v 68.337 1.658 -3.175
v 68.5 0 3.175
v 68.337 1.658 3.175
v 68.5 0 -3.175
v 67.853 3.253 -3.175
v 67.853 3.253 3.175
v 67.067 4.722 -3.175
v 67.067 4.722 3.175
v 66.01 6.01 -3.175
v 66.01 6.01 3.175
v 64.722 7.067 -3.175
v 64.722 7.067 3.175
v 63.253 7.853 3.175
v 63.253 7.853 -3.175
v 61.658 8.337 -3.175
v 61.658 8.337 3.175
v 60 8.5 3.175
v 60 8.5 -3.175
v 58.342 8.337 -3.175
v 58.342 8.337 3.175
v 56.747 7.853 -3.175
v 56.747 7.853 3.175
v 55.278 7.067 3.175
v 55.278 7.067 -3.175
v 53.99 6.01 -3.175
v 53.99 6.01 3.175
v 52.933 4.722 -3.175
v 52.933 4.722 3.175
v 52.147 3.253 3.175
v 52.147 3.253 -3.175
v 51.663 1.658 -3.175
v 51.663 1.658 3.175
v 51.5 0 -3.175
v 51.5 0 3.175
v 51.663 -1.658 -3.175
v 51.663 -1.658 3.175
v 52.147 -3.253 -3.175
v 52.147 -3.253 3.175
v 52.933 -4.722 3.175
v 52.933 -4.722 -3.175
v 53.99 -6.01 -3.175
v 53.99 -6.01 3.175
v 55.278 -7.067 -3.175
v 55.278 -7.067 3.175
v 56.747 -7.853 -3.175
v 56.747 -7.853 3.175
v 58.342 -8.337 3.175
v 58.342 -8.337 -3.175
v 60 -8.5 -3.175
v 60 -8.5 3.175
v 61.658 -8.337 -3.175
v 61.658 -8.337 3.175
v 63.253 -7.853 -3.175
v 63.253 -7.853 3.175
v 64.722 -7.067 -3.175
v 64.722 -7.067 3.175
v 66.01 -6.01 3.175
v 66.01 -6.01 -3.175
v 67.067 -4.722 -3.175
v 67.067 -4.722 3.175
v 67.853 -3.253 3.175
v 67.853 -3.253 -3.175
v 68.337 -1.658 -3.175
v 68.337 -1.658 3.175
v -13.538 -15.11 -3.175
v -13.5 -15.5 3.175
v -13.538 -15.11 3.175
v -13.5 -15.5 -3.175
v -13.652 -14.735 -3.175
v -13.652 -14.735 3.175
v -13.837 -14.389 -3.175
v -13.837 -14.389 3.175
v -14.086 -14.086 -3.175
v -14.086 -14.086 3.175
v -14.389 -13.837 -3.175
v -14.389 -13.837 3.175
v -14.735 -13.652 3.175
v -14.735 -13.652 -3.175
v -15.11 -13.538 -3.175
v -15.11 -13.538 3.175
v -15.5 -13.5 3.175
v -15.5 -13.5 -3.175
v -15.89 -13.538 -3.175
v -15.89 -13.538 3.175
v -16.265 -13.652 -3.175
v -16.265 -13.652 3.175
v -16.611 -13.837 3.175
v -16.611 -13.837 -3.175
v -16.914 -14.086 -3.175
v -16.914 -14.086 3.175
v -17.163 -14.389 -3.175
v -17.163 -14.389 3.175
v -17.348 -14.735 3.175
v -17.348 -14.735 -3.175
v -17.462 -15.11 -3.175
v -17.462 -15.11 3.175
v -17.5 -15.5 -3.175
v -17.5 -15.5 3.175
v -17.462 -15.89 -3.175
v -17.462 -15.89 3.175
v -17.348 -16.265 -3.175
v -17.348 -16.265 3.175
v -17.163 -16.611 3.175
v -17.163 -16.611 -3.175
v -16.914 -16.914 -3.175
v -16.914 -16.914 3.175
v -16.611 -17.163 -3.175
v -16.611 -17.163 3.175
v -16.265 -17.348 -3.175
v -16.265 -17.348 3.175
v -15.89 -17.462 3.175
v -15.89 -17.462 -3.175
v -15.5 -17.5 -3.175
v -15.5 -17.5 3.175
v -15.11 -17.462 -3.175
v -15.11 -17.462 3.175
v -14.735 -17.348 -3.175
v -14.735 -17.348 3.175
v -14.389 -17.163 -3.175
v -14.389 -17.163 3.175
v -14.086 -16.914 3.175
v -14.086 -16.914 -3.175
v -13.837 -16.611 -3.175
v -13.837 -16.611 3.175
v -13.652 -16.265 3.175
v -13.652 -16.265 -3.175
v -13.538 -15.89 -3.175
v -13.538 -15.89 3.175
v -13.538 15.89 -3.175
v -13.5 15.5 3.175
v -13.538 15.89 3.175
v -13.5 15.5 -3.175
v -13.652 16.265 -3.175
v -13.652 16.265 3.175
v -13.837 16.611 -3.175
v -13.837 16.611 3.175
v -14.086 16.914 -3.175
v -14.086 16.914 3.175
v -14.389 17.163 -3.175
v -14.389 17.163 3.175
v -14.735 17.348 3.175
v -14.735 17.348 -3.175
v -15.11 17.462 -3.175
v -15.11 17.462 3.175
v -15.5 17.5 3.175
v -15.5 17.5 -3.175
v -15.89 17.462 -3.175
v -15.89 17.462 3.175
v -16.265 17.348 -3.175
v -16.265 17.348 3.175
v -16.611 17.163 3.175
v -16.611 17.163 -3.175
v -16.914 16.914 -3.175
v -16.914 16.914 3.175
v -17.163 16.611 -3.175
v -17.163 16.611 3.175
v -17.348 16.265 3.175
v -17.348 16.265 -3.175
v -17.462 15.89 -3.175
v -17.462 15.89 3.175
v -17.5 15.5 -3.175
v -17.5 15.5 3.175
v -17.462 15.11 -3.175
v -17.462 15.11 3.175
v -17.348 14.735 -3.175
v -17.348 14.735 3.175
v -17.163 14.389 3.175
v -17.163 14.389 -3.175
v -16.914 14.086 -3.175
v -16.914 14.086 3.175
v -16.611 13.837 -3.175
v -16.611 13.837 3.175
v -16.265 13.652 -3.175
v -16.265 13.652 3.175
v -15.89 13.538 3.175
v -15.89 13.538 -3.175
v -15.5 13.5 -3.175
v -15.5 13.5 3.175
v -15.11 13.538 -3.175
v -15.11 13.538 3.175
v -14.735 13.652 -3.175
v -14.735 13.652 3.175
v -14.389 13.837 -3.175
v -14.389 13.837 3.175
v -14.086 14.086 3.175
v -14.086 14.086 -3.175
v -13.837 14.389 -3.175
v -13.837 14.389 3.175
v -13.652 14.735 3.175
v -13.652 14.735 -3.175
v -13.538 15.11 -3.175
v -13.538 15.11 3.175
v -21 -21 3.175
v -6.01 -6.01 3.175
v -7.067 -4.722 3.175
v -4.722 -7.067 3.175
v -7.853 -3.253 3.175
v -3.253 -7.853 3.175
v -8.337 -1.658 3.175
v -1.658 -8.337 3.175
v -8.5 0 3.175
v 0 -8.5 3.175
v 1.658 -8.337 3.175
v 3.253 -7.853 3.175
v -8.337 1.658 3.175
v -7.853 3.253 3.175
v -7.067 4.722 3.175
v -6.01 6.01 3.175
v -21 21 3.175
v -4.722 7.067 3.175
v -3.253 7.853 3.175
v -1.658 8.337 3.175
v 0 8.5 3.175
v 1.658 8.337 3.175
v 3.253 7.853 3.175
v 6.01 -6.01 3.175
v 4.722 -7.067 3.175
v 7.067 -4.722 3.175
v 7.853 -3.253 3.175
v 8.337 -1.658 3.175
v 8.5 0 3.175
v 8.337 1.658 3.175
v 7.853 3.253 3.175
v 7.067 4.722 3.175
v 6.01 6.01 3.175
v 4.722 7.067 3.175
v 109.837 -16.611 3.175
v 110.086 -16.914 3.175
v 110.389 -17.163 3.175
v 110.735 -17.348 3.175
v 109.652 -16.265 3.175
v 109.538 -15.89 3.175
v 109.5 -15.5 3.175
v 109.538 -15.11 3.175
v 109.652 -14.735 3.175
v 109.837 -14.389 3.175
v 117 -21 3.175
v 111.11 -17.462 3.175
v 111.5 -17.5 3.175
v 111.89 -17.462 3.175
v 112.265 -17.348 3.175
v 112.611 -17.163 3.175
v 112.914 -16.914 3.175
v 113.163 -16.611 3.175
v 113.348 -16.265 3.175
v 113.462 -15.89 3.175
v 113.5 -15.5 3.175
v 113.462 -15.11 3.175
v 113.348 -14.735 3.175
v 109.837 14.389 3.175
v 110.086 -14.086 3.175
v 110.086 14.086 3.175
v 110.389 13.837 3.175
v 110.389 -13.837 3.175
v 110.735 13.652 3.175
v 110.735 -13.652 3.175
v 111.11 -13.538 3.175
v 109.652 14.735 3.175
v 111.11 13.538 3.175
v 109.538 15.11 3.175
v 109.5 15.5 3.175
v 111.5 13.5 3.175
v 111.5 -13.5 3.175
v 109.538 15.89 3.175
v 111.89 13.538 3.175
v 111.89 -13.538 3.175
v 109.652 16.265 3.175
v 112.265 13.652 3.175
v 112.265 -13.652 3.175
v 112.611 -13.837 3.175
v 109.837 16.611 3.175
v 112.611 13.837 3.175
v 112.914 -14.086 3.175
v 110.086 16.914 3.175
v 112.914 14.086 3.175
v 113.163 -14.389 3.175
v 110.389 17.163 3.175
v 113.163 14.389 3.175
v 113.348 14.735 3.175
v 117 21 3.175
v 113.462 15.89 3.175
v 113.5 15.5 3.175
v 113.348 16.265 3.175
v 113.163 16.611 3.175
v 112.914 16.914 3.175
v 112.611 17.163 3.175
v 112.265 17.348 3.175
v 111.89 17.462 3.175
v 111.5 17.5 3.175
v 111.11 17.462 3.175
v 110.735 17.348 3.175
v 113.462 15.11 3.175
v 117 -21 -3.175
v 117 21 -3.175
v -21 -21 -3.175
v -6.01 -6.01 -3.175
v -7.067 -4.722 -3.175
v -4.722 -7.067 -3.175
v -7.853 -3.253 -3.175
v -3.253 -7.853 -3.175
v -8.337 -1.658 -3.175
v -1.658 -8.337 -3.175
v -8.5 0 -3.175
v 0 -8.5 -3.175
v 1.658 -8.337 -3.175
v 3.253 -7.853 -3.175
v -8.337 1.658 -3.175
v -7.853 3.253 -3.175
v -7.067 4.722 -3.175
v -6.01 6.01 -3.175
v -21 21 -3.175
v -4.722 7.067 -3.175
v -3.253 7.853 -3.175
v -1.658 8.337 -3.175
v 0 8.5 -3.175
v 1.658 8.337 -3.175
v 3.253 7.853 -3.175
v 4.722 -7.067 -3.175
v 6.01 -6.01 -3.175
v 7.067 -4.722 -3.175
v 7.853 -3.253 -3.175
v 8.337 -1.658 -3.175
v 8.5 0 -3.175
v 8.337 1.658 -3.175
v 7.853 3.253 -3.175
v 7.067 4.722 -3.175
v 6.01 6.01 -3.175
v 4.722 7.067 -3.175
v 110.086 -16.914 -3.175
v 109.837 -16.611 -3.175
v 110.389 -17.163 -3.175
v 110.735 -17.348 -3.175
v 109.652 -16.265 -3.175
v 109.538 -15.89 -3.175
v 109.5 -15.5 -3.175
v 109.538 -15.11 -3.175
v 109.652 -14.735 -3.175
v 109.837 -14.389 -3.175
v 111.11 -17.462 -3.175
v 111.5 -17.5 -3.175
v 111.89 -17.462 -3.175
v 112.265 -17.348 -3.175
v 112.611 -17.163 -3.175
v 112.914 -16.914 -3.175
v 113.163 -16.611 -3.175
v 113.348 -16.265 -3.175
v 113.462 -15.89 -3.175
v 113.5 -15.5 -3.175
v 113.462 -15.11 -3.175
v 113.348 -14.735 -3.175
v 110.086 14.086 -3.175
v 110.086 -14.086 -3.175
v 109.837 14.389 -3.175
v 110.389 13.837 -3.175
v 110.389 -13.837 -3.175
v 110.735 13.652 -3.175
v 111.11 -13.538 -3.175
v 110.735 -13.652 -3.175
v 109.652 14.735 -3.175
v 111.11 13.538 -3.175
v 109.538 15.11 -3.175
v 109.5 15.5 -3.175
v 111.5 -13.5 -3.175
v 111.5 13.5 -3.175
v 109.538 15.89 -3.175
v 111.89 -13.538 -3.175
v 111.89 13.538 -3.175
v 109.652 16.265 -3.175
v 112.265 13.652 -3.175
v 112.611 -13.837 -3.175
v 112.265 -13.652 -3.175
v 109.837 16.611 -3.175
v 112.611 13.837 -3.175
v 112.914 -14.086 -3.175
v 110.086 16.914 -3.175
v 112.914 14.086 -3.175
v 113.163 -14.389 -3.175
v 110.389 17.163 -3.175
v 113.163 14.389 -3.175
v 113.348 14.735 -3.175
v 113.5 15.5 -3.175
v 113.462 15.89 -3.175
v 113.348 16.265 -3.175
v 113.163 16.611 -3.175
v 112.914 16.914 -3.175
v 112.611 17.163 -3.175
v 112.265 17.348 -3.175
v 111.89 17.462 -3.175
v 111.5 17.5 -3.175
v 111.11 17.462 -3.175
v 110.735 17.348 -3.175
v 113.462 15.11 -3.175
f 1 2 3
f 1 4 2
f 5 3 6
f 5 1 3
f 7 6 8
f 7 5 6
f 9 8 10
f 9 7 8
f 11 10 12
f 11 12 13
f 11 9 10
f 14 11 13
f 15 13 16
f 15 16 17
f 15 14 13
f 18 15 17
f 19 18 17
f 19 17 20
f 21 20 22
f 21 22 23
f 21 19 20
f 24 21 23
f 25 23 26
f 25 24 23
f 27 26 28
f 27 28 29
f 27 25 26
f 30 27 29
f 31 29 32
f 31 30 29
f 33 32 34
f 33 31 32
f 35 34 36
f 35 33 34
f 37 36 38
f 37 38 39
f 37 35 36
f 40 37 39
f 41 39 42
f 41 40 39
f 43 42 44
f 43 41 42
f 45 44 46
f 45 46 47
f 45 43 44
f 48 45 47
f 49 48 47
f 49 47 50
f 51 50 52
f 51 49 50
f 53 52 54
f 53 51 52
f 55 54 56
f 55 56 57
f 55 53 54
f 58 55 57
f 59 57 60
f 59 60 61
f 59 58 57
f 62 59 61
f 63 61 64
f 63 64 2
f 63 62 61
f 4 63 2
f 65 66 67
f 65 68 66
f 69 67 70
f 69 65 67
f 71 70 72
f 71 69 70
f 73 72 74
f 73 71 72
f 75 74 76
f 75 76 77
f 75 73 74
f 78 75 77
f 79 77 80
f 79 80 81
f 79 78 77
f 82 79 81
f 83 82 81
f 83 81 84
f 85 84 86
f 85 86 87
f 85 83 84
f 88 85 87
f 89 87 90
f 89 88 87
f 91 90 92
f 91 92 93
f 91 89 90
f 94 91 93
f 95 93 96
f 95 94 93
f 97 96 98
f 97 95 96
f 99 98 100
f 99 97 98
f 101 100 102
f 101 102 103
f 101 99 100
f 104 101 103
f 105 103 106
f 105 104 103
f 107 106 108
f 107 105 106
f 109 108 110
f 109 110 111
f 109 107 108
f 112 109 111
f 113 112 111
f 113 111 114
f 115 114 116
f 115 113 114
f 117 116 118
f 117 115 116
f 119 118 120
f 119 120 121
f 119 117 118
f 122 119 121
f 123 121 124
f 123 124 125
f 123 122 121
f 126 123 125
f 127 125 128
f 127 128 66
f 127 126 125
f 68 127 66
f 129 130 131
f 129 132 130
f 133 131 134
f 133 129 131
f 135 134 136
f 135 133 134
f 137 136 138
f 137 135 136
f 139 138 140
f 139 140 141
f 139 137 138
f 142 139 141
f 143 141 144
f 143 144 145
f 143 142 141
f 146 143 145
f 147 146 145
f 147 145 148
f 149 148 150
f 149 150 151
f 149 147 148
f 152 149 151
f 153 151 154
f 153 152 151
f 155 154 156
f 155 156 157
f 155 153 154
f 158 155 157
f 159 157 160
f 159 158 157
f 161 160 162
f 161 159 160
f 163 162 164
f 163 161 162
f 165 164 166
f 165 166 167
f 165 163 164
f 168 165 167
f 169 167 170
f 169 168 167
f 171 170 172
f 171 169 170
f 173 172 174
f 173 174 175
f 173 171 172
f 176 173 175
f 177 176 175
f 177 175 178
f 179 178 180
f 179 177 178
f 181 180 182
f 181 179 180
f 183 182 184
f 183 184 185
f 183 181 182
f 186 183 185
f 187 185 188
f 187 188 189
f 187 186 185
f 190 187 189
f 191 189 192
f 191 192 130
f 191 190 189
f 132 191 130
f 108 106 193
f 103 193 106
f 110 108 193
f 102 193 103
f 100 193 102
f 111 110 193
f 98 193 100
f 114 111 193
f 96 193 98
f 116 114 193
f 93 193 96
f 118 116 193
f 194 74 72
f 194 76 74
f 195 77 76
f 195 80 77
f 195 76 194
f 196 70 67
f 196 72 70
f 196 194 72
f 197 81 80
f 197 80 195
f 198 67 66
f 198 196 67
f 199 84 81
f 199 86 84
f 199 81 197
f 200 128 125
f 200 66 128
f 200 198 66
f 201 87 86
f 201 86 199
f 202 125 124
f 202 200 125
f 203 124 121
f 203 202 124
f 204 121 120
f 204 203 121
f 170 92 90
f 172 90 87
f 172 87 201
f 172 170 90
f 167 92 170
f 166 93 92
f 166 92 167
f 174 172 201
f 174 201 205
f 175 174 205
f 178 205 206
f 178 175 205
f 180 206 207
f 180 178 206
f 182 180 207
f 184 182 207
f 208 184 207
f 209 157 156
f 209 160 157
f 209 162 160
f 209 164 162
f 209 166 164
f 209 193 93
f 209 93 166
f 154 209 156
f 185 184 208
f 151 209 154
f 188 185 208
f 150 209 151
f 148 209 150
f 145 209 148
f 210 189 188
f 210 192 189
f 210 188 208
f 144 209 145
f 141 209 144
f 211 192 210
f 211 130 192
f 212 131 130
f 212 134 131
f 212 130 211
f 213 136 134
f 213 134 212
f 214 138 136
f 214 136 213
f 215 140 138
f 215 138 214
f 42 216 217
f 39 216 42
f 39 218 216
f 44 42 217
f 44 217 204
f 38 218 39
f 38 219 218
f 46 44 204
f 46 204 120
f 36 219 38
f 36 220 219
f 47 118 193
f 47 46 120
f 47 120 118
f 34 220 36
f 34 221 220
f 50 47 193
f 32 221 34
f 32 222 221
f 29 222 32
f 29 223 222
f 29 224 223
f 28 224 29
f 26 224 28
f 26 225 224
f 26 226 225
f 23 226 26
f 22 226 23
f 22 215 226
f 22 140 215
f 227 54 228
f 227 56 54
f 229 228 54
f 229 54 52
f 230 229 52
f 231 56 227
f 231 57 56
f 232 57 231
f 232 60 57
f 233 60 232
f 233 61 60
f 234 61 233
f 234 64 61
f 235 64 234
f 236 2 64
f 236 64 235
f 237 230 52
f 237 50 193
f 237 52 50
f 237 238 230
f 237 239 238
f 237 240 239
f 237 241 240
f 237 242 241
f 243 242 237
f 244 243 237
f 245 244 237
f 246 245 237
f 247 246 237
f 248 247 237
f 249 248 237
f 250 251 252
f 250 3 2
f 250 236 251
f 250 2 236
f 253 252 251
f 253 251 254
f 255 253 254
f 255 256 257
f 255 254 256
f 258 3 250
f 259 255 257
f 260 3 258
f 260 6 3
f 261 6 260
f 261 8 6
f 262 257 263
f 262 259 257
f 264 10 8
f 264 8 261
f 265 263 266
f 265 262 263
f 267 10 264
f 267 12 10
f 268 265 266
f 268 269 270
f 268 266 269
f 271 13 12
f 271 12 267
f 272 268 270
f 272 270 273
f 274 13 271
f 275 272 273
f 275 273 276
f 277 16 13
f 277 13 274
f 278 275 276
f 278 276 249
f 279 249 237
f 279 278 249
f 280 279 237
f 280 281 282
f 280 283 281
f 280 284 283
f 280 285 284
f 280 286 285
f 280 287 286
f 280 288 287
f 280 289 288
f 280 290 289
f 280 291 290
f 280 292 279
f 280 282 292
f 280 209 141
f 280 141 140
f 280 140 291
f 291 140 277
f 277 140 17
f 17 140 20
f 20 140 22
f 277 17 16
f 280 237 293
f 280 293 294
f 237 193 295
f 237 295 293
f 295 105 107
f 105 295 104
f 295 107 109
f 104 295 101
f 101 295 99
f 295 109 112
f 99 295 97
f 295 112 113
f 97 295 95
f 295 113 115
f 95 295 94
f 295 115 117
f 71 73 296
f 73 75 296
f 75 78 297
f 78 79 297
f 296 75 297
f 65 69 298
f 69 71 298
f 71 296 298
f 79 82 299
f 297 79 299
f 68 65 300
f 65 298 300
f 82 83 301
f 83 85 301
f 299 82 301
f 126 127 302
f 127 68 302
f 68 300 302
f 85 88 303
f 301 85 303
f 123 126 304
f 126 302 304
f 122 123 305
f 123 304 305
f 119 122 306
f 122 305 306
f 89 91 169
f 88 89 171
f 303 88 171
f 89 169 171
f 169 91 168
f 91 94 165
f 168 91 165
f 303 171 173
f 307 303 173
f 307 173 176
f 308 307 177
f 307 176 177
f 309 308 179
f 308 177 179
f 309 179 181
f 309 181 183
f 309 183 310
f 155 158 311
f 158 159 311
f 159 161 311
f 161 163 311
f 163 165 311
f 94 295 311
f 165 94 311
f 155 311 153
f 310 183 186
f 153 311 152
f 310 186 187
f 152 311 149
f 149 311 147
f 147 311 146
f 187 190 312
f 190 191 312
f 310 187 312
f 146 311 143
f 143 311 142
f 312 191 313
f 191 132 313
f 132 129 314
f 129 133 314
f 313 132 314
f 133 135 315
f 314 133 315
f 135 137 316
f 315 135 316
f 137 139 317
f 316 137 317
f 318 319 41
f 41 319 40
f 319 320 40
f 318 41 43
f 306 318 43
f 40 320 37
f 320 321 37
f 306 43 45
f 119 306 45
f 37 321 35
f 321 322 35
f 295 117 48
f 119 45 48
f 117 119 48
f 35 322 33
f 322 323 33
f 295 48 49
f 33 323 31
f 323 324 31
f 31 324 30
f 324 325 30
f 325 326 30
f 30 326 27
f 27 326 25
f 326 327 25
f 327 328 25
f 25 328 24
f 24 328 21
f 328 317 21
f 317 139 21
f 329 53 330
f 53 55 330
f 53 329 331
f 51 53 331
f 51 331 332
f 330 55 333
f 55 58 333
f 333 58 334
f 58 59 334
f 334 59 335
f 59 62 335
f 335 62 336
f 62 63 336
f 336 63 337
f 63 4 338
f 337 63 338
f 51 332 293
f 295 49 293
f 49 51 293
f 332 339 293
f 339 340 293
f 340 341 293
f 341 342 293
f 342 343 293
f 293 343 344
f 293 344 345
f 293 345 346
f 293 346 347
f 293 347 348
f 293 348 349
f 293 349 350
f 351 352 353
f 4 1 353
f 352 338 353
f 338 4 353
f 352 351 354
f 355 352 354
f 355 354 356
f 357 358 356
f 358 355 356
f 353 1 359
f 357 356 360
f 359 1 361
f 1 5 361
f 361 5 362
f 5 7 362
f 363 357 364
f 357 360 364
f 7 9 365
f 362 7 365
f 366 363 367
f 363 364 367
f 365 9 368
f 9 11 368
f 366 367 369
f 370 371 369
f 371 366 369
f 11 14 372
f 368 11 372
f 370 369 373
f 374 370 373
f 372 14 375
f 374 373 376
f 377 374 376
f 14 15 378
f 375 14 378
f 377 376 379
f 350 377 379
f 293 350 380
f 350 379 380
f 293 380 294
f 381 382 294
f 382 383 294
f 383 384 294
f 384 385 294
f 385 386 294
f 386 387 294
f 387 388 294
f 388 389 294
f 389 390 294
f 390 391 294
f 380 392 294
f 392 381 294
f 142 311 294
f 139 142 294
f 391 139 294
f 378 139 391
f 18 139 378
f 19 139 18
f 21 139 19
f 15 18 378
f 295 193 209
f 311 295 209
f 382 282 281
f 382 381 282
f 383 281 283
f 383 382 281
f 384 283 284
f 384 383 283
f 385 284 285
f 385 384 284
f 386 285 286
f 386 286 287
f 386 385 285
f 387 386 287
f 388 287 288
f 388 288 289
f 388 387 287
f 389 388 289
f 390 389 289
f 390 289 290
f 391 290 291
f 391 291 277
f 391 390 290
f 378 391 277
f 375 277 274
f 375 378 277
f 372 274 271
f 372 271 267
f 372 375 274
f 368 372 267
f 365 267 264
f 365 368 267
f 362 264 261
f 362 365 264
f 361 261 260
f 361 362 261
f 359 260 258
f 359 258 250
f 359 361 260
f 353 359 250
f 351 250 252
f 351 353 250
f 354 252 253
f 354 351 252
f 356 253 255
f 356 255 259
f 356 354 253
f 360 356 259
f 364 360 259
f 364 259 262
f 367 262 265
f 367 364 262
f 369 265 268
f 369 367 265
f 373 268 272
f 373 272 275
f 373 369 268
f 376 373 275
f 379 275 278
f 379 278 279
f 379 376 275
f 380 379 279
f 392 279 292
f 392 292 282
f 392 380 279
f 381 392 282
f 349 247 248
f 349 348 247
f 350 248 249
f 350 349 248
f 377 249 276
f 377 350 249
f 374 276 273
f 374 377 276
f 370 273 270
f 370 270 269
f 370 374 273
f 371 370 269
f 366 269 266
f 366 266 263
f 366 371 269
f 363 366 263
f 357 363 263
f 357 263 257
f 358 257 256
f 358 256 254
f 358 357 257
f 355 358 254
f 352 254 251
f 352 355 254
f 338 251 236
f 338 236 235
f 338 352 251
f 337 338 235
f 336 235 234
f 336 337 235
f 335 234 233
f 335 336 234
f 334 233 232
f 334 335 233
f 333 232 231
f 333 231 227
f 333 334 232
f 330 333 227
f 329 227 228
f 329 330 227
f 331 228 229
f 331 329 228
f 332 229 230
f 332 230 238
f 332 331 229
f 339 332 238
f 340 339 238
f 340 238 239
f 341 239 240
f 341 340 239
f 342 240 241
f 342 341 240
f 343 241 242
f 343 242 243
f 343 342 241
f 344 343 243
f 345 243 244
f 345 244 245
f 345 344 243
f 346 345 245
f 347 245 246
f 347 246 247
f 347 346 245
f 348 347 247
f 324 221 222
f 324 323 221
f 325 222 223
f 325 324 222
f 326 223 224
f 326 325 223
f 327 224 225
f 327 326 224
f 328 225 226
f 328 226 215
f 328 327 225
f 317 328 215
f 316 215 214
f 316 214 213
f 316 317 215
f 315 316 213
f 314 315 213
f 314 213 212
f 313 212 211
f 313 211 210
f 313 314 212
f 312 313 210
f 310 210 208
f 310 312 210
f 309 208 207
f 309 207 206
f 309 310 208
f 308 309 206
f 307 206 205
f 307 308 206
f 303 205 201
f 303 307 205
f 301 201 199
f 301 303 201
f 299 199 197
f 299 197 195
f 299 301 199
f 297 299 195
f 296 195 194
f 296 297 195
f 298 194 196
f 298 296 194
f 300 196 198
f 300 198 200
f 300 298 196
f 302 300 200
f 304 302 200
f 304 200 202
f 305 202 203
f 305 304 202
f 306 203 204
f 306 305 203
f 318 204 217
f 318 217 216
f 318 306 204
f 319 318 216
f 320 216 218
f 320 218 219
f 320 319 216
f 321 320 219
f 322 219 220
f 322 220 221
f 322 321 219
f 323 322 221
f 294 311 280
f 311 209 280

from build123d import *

# Parameters (mm, degrees)
SKETCH2_W           = 138
SKETCH2_H           = 42
SKETCH2_R           = 2
SKETCH2_R_2         = 8.5
BOSS_EXTRUDE1_DEPTH = 3.175


with BuildPart() as part:
    # Sketch2 → Boss-Extrude1 (new, symmetric)
    with BuildSketch(Plane.XY):
        with Locations((48, 0)):
            Rectangle(SKETCH2_W, SKETCH2_H)
        with Locations((-15.5, -15.5)):
            Circle(SKETCH2_R, mode=Mode.SUBTRACT)
        with Locations((-15.5, 15.5)):
            Circle(SKETCH2_R, mode=Mode.SUBTRACT)
        with Locations((111.5, 15.5)):
            Circle(SKETCH2_R, mode=Mode.SUBTRACT)
        with Locations((111.5, -15.5)):
            Circle(SKETCH2_R, mode=Mode.SUBTRACT)
        Circle(SKETCH2_R_2, mode=Mode.SUBTRACT)
        with Locations((60, 0)):
            Circle(SKETCH2_R_2, mode=Mode.SUBTRACT)
    extrude(amount=BOSS_EXTRUDE1_DEPTH, both=True)


solid = part.part
